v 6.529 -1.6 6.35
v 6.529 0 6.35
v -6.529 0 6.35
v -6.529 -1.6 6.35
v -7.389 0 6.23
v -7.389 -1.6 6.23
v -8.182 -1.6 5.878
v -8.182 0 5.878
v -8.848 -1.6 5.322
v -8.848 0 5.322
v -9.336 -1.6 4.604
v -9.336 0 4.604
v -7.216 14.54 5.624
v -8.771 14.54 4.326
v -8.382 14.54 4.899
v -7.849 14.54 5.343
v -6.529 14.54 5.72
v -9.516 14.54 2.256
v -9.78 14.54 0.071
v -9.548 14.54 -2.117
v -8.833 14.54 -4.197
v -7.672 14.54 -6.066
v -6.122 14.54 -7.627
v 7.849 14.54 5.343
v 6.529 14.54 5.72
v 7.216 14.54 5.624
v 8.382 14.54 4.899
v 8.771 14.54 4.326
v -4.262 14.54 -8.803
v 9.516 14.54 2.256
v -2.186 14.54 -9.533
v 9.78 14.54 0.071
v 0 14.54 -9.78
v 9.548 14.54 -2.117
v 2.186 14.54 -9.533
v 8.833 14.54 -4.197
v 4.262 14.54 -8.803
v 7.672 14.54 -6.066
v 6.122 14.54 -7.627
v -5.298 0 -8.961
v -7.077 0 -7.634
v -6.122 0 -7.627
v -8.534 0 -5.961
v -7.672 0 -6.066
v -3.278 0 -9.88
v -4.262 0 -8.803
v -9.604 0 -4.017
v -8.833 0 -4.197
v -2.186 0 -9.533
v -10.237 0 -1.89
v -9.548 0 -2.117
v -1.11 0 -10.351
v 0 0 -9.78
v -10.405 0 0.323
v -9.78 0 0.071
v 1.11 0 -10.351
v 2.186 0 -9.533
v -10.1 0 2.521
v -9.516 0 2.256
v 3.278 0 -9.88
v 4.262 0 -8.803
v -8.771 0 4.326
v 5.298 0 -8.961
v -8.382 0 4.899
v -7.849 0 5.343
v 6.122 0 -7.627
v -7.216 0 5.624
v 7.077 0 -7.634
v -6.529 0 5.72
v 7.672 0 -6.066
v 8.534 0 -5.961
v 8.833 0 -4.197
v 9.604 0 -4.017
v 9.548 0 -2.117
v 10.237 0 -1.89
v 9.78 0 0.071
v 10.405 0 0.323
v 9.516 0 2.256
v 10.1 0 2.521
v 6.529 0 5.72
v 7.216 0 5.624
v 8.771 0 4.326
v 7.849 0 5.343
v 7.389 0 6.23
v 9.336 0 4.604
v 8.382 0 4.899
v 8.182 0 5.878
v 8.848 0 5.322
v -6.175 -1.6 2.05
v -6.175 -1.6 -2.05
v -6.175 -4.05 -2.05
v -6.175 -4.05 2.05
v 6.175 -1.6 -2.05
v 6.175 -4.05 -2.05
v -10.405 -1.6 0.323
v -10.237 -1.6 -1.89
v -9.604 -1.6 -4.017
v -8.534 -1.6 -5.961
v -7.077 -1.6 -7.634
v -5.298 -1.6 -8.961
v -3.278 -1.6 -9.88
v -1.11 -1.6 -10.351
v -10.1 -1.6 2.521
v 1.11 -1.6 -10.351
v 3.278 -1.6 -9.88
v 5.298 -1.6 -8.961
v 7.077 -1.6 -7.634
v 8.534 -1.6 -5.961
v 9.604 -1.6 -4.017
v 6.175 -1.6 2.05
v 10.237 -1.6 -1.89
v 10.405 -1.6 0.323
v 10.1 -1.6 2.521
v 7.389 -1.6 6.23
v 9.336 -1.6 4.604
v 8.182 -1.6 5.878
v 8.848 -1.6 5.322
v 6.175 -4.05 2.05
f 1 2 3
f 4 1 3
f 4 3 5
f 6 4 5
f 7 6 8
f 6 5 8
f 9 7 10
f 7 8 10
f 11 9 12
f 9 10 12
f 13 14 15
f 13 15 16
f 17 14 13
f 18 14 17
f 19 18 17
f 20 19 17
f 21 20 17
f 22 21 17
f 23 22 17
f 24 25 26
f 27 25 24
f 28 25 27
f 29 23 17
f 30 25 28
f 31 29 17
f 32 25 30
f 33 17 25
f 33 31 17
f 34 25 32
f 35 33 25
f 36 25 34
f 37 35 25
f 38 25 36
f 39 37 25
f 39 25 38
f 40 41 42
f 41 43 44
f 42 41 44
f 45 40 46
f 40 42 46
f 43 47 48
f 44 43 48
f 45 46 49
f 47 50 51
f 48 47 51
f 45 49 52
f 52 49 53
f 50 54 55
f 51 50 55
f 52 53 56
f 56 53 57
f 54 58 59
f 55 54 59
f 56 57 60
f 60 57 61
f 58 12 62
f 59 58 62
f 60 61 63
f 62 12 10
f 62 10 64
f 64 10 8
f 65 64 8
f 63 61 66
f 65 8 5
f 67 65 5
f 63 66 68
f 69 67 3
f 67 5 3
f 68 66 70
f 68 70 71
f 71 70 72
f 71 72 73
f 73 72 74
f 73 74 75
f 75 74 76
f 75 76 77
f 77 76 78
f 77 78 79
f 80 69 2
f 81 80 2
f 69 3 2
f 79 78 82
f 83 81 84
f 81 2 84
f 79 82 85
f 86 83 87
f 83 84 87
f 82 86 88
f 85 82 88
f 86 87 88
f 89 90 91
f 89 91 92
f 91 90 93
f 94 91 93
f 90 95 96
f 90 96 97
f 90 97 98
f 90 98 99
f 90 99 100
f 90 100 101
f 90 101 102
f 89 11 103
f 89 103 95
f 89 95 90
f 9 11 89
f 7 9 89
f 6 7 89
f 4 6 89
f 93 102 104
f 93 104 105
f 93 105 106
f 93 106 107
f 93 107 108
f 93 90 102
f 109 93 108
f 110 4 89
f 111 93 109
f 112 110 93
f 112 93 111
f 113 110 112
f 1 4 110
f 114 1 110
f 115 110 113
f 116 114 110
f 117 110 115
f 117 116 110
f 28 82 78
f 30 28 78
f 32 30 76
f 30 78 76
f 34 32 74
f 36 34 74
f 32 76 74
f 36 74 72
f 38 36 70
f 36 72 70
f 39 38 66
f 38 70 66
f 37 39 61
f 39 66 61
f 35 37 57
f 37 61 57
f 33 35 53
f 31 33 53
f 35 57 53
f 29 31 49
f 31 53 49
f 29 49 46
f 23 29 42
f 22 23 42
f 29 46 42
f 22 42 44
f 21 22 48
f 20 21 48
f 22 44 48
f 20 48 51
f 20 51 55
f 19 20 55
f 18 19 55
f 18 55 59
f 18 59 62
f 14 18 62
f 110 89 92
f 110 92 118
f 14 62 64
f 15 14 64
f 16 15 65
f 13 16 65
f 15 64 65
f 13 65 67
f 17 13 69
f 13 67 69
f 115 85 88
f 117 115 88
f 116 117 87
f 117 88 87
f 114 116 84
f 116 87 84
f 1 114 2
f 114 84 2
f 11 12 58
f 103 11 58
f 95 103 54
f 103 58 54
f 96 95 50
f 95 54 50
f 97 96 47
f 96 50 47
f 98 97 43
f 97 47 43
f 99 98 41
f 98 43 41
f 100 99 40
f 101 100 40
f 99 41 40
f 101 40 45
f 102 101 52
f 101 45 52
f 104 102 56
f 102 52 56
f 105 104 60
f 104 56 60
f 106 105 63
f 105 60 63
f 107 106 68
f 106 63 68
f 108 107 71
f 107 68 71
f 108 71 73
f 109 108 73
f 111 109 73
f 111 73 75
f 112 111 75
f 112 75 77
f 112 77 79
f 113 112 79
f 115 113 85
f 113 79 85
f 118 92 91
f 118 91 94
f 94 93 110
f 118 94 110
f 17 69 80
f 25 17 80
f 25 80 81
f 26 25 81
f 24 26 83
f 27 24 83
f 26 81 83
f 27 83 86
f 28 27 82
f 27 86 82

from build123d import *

# Parameters (mm, degrees)
BOSS_EXTRUDE1_DEPTH = 14.54
BOSS_EXTRUDE2_DEPTH = 1.6
SKETCH5_W           = 12.35
SKETCH5_H           = 4.1
BOSS_EXTRUDE3_DEPTH = 2.45


with BuildPart() as part:
    # Sketch1 → Boss-Extrude1 (new body)
    with BuildSketch(Plane(origin=(0, 0, 0), x_dir=(1, 0, 0), z_dir=(0, 1, 0))):
        with BuildLine():
            Line((-6.529165337, -5.72), (6.529165337, -5.72))
            ThreePointArc((6.529165337, -5.72), (7.849312473, -5.343019439), (8.771323763, -4.325769231))
            ThreePointArc((8.771323763, -4.325769231), (0, 9.78), (-8.771323763, -4.325769231))
            ThreePointArc((-8.771323763, -4.325769231), (-7.849312473, -5.343019439), (-6.529165337, -5.72))
        make_face()
    extrude(amount=BOSS_EXTRUDE1_DEPTH)

    # Sketch3 → Boss-Extrude2 (add)
    with BuildSketch(Plane.XZ):
        with BuildLine():
            Line((6.529165337, 6.35), (-6.529165337, 6.35))
            ThreePointArc((-6.529165337, 6.35), (-8.181989552, 5.878020338), (-9.336347687, 4.604423077))
            ThreePointArc((-9.336347687, 4.604423077), (0, -10.41), (9.336347687, 4.604423077))
            ThreePointArc((9.336347687, 4.604423077), (8.181989552, 5.878020338), (6.529165337, 6.35))
        make_face()
    extrude(amount=BOSS_EXTRUDE2_DEPTH)

    # Sketch5 → Boss-Extrude3 (add)
    with BuildSketch(Plane.XZ.offset(1.6)):
        Rectangle(SKETCH5_W, SKETCH5_H)
    extrude(amount=BOSS_EXTRUDE3_DEPTH)


solid = part.part
